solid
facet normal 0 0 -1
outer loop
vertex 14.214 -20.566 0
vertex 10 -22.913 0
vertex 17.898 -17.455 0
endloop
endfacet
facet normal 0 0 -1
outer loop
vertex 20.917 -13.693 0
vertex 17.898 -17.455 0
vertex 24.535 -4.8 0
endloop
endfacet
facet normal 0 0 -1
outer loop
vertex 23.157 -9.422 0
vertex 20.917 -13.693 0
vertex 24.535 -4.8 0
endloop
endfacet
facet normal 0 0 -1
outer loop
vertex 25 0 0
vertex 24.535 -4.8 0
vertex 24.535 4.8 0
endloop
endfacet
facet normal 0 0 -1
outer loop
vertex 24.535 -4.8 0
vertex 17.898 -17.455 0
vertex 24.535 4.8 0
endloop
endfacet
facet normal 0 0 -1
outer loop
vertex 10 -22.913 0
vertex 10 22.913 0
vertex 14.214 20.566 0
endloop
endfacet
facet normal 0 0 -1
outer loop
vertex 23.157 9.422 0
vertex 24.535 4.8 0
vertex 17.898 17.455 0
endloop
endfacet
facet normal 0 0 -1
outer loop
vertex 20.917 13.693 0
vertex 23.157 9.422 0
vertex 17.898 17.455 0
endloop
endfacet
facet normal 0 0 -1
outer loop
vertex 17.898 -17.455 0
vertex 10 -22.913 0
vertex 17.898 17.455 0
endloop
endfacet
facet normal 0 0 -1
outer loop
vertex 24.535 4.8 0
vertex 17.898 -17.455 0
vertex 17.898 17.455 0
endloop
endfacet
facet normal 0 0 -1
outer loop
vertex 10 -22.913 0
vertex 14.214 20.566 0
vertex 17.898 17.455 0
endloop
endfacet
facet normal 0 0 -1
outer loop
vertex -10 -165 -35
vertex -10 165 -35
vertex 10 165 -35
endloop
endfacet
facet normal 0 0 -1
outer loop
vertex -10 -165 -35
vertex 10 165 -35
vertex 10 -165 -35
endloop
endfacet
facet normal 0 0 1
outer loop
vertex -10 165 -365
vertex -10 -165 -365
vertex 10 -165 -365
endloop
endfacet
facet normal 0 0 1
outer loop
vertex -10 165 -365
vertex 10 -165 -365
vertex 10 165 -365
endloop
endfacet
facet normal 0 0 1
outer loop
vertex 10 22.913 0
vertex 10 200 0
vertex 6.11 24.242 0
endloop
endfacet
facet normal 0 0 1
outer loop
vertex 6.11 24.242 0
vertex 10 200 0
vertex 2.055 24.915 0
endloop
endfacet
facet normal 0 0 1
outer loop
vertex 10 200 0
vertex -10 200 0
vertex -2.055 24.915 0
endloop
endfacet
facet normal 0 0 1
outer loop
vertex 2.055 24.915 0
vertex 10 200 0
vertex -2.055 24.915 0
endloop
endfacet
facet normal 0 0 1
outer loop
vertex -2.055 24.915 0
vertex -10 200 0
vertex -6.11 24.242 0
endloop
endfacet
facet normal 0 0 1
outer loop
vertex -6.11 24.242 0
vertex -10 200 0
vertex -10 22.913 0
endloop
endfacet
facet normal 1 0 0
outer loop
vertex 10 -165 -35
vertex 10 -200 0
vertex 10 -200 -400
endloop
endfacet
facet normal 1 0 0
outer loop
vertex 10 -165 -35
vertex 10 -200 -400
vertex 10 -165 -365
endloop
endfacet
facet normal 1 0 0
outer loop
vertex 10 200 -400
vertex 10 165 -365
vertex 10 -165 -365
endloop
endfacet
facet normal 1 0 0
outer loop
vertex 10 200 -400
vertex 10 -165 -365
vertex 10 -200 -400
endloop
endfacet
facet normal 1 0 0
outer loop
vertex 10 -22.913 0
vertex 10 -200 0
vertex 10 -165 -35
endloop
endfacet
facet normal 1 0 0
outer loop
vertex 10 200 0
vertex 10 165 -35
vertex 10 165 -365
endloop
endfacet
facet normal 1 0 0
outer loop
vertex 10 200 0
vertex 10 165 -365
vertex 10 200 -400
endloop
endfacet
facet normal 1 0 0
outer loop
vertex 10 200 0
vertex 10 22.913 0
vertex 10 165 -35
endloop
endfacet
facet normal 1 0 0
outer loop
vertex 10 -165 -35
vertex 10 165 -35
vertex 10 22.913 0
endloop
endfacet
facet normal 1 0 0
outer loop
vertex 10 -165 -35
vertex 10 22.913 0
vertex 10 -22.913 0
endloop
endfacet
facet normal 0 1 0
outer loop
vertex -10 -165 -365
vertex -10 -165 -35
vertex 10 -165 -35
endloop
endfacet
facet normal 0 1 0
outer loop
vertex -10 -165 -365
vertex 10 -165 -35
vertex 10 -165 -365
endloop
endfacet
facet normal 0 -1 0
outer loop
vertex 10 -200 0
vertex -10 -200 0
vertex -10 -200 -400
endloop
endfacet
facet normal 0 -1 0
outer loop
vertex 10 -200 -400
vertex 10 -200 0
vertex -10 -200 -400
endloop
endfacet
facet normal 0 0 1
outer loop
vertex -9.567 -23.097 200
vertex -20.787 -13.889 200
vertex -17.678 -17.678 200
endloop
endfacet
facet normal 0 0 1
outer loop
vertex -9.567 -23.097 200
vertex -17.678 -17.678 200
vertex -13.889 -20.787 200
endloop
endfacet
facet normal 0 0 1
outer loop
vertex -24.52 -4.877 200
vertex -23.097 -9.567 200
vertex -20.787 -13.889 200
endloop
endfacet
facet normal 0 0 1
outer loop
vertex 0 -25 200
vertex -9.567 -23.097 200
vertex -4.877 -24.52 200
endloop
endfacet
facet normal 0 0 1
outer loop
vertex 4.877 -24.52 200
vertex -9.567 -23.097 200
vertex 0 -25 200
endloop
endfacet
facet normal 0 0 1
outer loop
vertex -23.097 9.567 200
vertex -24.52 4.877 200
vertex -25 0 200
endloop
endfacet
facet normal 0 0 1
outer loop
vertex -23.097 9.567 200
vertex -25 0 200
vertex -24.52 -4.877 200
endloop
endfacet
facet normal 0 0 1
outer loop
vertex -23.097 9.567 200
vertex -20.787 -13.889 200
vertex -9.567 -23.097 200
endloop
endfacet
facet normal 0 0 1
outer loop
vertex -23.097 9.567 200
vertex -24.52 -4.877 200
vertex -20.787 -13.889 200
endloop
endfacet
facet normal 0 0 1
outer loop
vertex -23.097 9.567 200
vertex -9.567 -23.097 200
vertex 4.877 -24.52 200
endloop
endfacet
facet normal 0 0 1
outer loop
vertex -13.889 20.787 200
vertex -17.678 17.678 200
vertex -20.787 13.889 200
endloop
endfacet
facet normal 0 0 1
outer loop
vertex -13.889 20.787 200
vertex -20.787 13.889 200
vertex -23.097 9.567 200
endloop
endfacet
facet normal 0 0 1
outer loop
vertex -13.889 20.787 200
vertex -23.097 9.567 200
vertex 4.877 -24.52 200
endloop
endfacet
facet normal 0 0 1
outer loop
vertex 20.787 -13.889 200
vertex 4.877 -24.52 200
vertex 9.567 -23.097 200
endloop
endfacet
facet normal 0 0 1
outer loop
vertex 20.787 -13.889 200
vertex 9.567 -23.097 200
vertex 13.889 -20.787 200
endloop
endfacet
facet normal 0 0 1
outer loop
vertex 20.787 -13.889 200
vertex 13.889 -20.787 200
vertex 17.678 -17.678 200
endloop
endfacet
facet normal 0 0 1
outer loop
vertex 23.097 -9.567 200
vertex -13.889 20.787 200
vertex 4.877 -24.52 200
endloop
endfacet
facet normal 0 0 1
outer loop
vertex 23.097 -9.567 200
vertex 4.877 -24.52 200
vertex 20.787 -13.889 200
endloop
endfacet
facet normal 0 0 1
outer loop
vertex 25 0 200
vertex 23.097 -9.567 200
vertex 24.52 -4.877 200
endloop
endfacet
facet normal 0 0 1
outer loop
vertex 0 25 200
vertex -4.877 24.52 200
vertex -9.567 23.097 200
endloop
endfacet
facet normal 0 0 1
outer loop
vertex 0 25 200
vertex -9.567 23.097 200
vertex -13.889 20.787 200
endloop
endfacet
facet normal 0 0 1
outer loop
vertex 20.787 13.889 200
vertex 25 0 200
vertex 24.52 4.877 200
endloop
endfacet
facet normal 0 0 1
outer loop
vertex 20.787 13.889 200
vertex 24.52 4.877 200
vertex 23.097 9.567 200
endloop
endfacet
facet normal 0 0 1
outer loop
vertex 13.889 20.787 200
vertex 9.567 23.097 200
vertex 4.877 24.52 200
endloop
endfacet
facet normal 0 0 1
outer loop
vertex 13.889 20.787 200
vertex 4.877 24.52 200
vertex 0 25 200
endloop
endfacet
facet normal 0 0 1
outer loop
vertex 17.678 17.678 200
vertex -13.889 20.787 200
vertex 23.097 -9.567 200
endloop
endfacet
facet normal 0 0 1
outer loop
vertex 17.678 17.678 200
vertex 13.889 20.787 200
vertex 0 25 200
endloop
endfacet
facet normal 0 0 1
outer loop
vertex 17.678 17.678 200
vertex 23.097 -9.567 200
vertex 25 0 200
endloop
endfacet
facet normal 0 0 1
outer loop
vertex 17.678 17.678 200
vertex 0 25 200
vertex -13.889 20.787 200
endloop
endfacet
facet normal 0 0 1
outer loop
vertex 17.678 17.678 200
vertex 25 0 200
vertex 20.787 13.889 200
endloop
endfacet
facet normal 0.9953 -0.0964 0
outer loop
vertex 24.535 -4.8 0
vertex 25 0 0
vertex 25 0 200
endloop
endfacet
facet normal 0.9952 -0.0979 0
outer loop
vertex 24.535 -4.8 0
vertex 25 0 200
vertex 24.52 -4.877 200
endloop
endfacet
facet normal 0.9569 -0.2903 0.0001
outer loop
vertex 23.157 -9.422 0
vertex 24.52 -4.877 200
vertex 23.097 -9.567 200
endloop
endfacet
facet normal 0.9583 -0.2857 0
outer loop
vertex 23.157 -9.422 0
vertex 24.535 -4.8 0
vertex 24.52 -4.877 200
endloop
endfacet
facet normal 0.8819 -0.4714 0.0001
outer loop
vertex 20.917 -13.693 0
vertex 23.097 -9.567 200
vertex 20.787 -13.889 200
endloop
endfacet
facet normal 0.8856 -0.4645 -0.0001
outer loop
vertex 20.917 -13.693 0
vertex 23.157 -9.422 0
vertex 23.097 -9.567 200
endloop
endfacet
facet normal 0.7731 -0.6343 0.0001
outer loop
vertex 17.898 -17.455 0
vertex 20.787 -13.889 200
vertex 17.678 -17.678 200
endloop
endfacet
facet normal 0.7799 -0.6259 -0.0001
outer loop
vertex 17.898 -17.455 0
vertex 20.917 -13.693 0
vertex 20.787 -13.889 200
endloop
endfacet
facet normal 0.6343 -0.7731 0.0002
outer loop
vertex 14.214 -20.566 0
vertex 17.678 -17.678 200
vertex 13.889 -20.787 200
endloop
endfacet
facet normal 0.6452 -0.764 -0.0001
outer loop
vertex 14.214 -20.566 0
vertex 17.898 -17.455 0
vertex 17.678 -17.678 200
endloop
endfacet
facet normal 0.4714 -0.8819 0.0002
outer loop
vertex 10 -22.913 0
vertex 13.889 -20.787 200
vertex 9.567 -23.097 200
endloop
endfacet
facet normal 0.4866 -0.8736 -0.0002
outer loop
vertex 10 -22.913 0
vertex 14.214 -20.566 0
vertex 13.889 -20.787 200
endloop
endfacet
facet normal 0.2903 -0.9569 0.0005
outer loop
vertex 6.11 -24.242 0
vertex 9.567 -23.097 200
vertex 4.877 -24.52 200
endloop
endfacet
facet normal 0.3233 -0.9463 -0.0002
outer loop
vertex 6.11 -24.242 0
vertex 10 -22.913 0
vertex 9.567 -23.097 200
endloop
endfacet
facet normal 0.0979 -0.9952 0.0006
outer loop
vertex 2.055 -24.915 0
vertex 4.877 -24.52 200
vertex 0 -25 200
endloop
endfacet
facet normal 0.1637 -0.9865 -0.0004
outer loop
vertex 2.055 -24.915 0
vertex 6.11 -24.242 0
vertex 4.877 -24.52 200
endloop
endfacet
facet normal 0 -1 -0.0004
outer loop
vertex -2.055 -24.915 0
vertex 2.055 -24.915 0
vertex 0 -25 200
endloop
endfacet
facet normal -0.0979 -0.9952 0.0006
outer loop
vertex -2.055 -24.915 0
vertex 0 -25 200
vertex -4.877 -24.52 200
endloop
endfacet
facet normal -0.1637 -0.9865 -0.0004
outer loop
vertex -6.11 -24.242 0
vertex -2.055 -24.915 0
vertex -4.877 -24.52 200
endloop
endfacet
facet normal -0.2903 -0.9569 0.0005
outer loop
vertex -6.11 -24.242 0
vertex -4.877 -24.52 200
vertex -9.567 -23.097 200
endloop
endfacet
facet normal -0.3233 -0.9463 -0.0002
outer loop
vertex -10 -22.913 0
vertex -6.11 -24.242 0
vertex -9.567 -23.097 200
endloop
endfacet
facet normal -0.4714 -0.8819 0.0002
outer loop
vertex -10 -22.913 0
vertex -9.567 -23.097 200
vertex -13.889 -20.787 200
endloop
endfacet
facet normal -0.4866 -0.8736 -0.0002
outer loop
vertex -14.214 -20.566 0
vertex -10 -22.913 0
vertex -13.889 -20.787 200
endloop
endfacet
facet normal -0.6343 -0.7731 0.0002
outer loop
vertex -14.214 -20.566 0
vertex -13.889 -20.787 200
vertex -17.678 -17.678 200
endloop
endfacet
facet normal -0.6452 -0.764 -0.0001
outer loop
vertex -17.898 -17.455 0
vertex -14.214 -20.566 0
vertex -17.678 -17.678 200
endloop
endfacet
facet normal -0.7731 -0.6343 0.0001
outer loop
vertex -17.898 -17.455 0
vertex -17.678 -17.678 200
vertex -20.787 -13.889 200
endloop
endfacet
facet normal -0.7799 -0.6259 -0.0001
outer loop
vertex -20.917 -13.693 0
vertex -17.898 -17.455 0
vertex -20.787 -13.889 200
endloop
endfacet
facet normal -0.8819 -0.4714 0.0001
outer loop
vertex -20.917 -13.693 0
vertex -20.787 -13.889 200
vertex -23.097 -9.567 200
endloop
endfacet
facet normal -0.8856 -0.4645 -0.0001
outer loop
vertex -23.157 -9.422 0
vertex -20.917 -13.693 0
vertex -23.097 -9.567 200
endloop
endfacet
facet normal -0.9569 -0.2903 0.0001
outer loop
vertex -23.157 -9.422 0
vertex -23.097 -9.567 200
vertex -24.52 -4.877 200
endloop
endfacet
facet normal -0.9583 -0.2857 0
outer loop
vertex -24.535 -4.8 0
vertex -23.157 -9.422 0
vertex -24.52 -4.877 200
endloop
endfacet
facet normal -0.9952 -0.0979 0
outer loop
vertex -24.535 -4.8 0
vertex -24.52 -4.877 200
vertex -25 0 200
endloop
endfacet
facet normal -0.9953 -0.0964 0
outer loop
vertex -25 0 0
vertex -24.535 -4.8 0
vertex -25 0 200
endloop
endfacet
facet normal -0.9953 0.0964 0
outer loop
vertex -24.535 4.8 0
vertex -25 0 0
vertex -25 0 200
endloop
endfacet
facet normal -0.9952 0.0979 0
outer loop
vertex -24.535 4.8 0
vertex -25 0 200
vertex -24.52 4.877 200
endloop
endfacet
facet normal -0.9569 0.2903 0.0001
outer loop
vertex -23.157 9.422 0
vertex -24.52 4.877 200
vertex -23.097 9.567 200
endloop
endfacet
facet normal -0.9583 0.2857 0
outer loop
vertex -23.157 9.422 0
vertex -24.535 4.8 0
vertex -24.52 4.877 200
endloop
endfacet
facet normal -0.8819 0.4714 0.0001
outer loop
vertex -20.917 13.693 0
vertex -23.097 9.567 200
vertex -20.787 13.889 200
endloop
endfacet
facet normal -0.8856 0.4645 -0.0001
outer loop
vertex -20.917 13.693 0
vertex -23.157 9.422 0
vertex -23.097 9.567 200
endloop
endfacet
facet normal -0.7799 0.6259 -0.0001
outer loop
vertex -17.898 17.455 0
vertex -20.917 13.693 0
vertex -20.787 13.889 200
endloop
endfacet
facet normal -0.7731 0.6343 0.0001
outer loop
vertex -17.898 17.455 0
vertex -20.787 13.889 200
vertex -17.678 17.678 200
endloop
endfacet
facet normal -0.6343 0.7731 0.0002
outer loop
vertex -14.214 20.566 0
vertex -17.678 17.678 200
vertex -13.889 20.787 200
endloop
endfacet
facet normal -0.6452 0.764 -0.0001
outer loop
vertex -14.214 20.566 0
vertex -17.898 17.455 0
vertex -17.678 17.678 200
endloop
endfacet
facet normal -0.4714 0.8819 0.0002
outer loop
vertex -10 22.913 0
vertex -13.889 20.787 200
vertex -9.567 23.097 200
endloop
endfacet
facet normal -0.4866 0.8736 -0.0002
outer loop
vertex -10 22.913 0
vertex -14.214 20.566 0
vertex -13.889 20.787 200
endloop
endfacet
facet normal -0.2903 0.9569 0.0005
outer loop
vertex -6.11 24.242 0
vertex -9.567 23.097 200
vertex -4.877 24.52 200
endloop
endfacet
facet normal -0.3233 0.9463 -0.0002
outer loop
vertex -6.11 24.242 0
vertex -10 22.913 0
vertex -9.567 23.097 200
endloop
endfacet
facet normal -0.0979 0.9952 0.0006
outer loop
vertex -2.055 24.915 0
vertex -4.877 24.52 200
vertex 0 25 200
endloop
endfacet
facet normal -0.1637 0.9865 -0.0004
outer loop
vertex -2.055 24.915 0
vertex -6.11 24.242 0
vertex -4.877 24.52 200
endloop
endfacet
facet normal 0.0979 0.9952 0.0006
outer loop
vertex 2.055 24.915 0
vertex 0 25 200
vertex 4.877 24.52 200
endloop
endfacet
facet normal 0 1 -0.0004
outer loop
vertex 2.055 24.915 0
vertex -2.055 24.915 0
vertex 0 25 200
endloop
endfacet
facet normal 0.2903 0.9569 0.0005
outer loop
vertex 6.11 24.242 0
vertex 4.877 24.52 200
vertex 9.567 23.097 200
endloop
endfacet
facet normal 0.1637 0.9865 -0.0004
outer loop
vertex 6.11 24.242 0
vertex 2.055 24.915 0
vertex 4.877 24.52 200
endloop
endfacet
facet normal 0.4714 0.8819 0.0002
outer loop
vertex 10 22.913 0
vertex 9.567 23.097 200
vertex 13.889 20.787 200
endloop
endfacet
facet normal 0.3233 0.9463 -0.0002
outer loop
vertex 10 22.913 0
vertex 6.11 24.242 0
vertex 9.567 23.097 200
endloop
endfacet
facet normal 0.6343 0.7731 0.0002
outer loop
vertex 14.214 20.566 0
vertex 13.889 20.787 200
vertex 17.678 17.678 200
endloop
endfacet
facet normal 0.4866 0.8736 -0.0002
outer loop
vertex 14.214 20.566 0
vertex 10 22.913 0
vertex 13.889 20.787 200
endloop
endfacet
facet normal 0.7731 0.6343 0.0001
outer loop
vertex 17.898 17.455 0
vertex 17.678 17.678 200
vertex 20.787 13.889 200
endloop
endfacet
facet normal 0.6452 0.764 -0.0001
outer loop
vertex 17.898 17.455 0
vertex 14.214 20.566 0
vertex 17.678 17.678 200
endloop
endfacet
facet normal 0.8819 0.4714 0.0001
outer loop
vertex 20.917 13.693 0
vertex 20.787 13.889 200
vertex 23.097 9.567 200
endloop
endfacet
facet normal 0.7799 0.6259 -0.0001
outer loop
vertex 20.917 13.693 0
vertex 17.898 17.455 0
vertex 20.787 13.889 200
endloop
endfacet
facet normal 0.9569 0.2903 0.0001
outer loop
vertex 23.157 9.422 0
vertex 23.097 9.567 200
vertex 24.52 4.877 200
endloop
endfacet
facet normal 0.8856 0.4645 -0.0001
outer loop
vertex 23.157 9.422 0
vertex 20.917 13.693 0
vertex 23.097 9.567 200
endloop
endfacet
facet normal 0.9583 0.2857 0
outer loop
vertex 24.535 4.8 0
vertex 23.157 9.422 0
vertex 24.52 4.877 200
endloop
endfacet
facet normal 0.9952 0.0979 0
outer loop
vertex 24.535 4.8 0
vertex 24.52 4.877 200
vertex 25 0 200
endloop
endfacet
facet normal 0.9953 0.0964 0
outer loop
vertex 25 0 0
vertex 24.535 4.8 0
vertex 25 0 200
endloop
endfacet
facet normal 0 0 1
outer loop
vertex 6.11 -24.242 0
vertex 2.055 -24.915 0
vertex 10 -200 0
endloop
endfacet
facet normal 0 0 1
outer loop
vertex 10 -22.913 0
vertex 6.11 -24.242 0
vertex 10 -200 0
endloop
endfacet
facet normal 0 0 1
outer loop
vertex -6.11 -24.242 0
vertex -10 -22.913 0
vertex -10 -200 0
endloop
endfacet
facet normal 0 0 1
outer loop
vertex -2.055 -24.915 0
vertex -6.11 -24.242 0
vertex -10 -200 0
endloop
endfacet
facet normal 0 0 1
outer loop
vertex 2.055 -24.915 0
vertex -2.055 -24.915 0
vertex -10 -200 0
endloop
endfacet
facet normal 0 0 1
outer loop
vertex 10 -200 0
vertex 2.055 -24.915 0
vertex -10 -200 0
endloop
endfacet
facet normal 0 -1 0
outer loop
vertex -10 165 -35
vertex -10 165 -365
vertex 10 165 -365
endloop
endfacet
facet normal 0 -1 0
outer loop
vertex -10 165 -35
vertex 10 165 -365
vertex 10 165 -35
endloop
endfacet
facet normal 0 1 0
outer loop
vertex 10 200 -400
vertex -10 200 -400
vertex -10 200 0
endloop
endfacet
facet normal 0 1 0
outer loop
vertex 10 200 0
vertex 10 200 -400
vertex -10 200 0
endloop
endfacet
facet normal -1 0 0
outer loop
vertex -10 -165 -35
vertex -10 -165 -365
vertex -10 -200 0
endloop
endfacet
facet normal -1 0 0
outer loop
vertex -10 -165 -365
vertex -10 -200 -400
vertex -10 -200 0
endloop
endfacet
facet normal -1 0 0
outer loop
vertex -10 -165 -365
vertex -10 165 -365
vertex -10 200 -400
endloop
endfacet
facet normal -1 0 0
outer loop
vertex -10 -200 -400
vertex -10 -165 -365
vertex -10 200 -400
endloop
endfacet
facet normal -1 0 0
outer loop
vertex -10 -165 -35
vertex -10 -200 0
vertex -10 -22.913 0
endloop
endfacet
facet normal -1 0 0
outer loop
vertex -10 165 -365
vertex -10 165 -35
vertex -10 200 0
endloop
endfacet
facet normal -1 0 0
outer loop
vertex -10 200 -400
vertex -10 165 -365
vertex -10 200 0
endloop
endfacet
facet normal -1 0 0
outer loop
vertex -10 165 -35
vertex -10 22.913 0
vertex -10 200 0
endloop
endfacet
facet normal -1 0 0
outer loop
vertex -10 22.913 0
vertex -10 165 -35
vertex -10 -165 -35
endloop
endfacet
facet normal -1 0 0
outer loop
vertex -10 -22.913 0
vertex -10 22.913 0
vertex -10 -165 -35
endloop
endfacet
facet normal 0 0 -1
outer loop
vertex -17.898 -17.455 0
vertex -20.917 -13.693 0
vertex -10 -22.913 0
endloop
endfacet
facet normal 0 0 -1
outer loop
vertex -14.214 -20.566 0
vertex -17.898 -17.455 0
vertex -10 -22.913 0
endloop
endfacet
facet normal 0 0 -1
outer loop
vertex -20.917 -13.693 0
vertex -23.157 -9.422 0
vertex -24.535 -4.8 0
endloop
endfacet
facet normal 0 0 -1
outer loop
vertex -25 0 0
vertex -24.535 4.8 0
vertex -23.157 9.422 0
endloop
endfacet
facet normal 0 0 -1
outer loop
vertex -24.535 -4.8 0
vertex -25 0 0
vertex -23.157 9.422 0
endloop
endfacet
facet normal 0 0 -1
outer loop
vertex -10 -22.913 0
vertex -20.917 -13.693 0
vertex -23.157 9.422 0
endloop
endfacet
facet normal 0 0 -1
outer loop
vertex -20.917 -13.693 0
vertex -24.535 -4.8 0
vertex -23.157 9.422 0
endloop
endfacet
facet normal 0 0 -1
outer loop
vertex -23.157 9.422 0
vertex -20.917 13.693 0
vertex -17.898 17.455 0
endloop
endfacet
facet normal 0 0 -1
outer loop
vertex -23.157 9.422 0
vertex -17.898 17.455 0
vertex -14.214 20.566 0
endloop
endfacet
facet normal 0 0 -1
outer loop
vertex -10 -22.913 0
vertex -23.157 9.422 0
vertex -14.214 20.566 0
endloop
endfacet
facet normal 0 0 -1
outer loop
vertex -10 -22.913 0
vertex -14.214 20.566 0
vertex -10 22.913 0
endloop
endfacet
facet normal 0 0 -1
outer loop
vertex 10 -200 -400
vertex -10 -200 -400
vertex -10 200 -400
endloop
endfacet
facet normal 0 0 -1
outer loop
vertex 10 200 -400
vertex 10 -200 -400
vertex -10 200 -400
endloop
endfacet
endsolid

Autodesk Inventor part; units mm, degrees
ref_plane "YZ Plane" through (0, 0, 0) normal (1, 0, 0) x (0, 1, 0)
ref_plane "XZ Plane" through (0, 0, 0) normal (0, 1, 0) x (-1, 0, 0)
ref_plane "XY Plane" through (0, 0, 0) normal (0, 0, 1) x (1, 0, 0)
sketch "Esquisse1" plane through (0, 0, 0) normal (0, 0, 1) x (1, 0, 0)
  circle A0 centre (0, 0) radius 25
  point P0 (0, -25)
  point P1 (0, 25)
  dimension "d0" = 50
extrude "Extrusion1" add sketch "Esquisse1" along normal blind 200
sketch "Esquisse2" plane through (0, 0, 0) normal (0, 0, -1) x (-1, 0, 0)
  point P0 (0, 0)
sketch "Esquisse3" plane through (0, 0, 200) normal (0, 0, 1) x (1, 0, 0)
  circle A0 centre (0, 0) radius 25 projected
  point P0 (0, -25)
ref_plane "Plan de construction1" through (0, -25, 0) normal (1, 0, 0) x (0, 1, 0)
sketch "Esquisse4" plane through (0, -25, 0) normal (1, 0, 0) x (0, 1, 0)
  line L0 (-175, -400) -> (225, -400)
  line L1 (225, -400) -> (225, 0)
  line L2 (225, 0) -> (-175, 0)
  line L3 (-175, 0) -> (-175, -400)
  line L4 (0, 0) -> (50, 0) projected
  line L5 (-140, -365) -> (190, -365)
  line L6 (190, -365) -> (190, -35)
  line L7 (190, -35) -> (-140, -35)
  line L8 (-140, -35) -> (-140, -365)
  point P0 (25, 0)
  dimension "d3" = 0
  dimension "d4" = 400
  dimension "d5" = 400
  dimension "d6" = 200
  dimension "d7" = 330
  dimension "d8" = 330
  dimension "d9" = 35
  dimension "d10" = 35
extrude "Extrusion2" add sketch "Esquisse4" along normal mid plane 20
ref_plane "Plan de construction2" through (0, 0, 100) normal (0, 0, 1) x (1, 0, 0)
sketch "Esquisse5" plane through (0, 0, 100) normal (0, 0, 1) x (1, 0, 0)
  circle A0 centre (0, 0) radius 25 projected
equation "\"d6\" = 0.5 * d4"
equation "\"d9\" = -0.5 * d8 + 0.5 * d5"
equation "\"d10\" = -0.5 * d8 + 0.5 * d5"
properties part number "raquetteEsquisse" material "Plastique ABS"
